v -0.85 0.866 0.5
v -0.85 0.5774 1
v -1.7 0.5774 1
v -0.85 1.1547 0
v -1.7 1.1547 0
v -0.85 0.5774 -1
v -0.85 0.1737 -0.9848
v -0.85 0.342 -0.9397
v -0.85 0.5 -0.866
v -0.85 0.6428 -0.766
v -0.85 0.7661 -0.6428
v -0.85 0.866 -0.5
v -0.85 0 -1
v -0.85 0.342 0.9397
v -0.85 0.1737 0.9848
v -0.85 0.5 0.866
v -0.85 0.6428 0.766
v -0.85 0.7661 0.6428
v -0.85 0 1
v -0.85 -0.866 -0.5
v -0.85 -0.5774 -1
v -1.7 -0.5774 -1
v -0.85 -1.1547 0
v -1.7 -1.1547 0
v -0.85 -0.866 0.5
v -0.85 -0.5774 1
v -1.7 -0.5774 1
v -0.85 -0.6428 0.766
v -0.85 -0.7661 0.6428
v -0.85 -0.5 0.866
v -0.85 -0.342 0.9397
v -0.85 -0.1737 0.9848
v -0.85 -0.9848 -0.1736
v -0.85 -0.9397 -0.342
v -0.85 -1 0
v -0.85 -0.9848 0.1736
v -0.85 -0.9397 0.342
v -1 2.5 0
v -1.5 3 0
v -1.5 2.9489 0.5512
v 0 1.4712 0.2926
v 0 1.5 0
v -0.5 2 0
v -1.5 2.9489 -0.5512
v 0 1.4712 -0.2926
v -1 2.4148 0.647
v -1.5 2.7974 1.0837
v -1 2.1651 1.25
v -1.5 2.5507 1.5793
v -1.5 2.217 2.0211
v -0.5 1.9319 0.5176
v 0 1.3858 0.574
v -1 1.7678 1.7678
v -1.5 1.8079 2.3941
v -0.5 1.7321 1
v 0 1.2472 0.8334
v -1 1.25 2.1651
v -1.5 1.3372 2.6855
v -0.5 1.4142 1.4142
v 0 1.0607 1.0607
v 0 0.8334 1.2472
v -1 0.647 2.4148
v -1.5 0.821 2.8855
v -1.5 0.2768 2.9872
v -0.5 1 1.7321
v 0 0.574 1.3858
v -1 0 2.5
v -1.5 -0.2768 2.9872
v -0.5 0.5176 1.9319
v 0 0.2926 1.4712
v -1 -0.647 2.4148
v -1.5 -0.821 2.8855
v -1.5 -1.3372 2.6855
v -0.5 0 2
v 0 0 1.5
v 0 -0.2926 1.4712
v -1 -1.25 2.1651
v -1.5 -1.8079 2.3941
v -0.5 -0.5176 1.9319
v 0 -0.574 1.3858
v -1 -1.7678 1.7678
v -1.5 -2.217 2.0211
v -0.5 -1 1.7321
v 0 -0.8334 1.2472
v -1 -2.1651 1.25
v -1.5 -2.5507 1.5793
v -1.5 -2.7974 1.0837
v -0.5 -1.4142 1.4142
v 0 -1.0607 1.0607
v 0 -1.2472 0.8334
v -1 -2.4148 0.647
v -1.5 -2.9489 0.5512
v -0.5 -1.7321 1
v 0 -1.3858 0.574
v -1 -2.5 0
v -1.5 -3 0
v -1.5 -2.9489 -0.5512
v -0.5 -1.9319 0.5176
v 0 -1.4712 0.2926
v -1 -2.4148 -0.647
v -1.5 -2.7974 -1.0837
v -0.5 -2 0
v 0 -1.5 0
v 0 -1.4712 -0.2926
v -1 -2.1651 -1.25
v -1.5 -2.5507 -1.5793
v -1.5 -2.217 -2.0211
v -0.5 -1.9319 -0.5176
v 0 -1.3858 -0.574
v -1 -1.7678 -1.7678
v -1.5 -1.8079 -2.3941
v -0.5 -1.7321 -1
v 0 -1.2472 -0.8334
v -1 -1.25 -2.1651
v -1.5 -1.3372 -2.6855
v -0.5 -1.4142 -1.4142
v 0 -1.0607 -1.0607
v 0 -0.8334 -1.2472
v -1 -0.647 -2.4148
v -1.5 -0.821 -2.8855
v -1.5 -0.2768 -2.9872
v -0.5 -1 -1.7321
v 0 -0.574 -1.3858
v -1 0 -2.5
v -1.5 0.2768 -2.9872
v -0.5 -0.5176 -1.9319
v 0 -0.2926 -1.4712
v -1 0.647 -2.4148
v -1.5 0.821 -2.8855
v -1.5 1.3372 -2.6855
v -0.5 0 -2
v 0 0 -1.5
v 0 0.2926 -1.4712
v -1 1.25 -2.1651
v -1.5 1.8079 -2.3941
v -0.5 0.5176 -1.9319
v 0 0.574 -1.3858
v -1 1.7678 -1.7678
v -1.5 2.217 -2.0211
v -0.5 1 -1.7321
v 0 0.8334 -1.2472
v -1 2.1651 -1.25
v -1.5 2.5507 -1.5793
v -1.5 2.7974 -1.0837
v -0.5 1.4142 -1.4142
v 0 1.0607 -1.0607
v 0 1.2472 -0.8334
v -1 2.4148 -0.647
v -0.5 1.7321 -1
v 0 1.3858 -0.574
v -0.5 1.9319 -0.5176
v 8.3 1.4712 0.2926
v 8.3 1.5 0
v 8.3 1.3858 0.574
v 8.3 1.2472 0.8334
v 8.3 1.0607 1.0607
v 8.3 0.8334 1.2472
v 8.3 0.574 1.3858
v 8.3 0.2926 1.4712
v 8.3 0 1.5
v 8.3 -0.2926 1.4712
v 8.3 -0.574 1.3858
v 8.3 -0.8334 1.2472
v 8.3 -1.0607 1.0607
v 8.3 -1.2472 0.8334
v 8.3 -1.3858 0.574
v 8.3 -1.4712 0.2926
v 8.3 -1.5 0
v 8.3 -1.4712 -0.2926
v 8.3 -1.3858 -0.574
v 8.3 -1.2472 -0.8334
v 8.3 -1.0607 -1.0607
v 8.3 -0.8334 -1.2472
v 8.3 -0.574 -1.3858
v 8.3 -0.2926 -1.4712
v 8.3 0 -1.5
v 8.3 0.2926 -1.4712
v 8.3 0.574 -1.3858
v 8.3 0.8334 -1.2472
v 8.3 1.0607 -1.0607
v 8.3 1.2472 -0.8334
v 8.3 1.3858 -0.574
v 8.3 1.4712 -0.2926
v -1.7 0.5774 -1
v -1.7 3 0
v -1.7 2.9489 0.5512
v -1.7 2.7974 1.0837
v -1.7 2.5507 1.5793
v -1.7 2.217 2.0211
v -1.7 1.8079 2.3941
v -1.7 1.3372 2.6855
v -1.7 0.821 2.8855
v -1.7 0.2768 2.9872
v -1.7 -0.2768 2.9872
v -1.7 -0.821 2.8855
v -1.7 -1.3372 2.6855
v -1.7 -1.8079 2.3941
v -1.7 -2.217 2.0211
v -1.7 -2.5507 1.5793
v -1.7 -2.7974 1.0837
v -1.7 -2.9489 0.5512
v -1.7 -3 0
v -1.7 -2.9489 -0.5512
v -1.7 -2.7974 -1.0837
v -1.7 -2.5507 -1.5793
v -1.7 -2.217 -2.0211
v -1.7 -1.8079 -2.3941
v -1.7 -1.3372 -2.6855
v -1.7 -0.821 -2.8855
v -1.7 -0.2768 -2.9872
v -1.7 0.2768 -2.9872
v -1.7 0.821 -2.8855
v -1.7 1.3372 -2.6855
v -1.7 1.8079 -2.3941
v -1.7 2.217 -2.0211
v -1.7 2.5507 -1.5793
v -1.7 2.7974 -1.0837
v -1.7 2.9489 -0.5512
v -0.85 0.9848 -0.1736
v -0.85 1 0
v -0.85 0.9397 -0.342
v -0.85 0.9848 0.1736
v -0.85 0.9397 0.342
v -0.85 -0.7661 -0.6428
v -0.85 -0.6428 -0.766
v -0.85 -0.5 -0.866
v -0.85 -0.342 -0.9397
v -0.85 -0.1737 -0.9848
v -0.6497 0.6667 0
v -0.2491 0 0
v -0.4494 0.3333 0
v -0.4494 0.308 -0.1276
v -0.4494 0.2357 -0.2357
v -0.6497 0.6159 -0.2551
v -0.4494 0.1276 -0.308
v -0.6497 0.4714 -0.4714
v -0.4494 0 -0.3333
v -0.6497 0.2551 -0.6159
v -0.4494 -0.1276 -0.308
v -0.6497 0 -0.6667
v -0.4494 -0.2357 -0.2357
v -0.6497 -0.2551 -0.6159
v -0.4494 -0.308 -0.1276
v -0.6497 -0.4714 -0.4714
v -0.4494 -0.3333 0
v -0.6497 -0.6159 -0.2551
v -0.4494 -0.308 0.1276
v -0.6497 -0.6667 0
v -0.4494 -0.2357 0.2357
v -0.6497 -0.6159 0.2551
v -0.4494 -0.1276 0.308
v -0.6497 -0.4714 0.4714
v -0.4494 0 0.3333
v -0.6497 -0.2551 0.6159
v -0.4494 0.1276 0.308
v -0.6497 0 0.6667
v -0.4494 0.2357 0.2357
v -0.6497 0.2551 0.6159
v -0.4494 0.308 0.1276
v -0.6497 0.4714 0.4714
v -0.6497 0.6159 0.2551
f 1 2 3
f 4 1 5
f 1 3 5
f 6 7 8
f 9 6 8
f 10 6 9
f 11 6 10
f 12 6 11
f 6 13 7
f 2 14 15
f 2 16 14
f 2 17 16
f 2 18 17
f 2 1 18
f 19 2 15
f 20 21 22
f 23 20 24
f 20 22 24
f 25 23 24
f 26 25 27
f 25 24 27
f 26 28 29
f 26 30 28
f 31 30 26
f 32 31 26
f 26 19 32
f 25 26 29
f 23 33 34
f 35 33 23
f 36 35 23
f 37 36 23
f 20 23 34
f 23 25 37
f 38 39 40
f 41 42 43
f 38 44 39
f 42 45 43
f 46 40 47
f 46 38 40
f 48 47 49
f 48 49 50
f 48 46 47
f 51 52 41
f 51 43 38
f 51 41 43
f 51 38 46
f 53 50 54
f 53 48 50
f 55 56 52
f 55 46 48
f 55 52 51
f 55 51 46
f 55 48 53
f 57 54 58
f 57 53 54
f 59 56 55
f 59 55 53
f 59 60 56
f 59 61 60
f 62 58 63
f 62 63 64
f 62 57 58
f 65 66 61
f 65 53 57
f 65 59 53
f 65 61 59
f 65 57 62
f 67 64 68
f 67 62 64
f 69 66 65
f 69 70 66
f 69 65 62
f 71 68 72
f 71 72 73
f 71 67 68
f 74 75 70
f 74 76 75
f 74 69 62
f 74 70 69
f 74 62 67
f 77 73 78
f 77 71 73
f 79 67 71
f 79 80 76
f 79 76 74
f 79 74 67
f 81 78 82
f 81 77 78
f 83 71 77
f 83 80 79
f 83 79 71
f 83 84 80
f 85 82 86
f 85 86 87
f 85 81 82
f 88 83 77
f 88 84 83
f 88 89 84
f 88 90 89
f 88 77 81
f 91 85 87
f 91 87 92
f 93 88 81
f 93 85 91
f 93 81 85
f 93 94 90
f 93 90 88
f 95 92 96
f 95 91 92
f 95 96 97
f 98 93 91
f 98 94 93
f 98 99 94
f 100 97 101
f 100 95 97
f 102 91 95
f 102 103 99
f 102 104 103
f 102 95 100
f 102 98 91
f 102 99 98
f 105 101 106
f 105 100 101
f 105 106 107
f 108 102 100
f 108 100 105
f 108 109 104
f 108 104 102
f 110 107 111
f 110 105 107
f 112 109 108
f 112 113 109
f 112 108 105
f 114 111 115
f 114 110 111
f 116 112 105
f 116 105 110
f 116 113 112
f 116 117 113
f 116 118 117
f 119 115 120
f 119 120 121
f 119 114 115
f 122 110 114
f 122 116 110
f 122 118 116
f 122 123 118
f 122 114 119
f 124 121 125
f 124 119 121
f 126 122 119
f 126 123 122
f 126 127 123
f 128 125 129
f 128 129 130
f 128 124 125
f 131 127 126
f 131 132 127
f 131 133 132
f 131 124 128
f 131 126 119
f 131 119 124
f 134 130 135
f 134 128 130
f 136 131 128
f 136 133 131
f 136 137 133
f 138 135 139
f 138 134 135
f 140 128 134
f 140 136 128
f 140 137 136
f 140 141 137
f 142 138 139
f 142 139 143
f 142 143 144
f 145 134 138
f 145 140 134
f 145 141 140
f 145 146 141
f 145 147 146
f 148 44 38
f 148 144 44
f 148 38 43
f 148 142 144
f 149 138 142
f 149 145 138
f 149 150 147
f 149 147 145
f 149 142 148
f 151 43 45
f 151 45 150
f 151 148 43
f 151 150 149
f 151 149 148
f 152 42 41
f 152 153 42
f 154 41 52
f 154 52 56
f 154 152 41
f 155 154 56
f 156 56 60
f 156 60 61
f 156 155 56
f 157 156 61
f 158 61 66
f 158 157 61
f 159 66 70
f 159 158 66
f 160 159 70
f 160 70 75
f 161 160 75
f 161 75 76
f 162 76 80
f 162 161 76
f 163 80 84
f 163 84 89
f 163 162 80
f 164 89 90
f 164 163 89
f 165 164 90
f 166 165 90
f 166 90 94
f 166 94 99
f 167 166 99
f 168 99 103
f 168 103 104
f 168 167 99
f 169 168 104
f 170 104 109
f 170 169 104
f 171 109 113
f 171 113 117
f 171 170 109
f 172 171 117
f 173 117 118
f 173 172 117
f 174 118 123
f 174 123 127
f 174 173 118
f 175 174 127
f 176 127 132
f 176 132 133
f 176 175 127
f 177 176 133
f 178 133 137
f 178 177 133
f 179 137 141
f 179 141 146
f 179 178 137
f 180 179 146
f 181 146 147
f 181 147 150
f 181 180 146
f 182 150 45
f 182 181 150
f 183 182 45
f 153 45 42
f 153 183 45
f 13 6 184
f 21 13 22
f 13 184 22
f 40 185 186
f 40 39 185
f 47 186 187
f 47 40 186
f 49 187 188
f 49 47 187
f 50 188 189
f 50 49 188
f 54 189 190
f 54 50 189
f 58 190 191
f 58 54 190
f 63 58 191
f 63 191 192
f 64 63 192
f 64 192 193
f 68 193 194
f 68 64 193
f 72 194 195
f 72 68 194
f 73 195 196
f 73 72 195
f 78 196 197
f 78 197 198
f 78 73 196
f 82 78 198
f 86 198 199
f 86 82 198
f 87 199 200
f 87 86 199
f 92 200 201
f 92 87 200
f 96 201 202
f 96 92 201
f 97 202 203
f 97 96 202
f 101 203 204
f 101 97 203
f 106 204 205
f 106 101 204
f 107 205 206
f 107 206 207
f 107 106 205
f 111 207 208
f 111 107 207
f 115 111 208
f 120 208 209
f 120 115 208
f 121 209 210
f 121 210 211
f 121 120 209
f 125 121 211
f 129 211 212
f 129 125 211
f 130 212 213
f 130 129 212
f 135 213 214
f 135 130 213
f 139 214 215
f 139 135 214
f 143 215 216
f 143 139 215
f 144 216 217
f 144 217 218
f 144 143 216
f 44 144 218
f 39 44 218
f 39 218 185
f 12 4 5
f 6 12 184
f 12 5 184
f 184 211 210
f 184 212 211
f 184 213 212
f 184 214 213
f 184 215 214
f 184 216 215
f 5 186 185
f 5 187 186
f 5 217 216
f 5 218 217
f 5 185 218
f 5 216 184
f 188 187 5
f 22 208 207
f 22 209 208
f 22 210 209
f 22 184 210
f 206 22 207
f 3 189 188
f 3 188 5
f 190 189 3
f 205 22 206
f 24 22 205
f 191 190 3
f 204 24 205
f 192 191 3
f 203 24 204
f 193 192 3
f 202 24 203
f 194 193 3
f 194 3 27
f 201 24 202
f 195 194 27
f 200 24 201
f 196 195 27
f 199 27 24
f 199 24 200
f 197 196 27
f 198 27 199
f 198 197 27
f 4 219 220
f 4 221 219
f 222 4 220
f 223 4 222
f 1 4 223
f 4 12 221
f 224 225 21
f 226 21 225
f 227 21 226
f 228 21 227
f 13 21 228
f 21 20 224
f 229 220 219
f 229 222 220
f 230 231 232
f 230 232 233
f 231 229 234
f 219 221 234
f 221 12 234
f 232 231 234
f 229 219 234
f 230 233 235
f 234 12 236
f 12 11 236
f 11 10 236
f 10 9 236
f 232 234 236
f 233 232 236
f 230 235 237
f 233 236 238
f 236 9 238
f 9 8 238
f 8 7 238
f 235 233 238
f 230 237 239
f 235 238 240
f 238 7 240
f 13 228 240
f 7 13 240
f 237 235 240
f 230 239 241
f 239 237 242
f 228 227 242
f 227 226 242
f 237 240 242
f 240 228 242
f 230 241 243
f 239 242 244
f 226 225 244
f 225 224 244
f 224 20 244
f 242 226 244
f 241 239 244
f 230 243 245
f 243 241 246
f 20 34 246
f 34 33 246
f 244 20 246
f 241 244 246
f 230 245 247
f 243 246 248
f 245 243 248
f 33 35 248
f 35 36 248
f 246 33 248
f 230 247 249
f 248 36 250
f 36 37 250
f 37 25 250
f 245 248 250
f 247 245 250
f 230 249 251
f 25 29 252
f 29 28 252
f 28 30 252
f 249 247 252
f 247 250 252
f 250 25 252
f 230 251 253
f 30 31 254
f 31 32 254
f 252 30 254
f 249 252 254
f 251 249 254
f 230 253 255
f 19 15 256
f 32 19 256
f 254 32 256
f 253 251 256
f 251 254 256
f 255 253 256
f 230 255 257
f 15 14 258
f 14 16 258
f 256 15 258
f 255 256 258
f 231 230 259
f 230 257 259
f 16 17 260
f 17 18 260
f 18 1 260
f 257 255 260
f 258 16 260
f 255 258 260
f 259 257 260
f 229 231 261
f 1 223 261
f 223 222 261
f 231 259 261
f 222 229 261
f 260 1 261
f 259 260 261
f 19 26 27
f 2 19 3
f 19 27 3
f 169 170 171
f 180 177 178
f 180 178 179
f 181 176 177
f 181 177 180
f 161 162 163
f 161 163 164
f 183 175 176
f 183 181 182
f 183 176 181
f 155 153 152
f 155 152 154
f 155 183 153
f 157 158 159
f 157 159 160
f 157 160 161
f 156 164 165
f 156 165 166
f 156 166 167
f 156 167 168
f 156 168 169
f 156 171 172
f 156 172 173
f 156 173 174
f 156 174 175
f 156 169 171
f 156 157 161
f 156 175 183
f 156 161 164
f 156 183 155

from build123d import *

# Parameters (mm, degrees)
CUT_EXTRUDE1_DEPTH = 0.85


with BuildPart() as part:
    # Sketch1 → Revolve1 (revolve)
    with BuildSketch(Plane.XY):
        Polygon((-1.7, 0), (-1.7, 3), (-1.5, 3), (0, 1.5), (8.3, 1.5), (8.3, 0), align=None)
    revolve(axis=Axis((-1.7, 0, 0), (1, 0, 0)))

    # Sketch2 → Cut-Revolve2 (revolve, cut)
    with BuildSketch(Plane.XY):
        Polygon((-0.249139381, 0), (-0.85, 1), (-1.7, 1), (-1.7, 0), align=None)
    revolve(axis=Axis((-0.249139381, 0, 0), (-1, 0, 0)), mode=Mode.SUBTRACT)

    # Sketch3 → Cut-Extrude1 (cut)
    with BuildSketch(Plane.ZY.offset(1.7)):
        Polygon((0, 1.154700538), (-1, 0.577350269), (-1, -0.577350269), (0, -1.154700538), (1, -0.577350269), (1, 0.577350269), align=None)
    extrude(amount=-CUT_EXTRUDE1_DEPTH, mode=Mode.SUBTRACT)


solid = part.part
